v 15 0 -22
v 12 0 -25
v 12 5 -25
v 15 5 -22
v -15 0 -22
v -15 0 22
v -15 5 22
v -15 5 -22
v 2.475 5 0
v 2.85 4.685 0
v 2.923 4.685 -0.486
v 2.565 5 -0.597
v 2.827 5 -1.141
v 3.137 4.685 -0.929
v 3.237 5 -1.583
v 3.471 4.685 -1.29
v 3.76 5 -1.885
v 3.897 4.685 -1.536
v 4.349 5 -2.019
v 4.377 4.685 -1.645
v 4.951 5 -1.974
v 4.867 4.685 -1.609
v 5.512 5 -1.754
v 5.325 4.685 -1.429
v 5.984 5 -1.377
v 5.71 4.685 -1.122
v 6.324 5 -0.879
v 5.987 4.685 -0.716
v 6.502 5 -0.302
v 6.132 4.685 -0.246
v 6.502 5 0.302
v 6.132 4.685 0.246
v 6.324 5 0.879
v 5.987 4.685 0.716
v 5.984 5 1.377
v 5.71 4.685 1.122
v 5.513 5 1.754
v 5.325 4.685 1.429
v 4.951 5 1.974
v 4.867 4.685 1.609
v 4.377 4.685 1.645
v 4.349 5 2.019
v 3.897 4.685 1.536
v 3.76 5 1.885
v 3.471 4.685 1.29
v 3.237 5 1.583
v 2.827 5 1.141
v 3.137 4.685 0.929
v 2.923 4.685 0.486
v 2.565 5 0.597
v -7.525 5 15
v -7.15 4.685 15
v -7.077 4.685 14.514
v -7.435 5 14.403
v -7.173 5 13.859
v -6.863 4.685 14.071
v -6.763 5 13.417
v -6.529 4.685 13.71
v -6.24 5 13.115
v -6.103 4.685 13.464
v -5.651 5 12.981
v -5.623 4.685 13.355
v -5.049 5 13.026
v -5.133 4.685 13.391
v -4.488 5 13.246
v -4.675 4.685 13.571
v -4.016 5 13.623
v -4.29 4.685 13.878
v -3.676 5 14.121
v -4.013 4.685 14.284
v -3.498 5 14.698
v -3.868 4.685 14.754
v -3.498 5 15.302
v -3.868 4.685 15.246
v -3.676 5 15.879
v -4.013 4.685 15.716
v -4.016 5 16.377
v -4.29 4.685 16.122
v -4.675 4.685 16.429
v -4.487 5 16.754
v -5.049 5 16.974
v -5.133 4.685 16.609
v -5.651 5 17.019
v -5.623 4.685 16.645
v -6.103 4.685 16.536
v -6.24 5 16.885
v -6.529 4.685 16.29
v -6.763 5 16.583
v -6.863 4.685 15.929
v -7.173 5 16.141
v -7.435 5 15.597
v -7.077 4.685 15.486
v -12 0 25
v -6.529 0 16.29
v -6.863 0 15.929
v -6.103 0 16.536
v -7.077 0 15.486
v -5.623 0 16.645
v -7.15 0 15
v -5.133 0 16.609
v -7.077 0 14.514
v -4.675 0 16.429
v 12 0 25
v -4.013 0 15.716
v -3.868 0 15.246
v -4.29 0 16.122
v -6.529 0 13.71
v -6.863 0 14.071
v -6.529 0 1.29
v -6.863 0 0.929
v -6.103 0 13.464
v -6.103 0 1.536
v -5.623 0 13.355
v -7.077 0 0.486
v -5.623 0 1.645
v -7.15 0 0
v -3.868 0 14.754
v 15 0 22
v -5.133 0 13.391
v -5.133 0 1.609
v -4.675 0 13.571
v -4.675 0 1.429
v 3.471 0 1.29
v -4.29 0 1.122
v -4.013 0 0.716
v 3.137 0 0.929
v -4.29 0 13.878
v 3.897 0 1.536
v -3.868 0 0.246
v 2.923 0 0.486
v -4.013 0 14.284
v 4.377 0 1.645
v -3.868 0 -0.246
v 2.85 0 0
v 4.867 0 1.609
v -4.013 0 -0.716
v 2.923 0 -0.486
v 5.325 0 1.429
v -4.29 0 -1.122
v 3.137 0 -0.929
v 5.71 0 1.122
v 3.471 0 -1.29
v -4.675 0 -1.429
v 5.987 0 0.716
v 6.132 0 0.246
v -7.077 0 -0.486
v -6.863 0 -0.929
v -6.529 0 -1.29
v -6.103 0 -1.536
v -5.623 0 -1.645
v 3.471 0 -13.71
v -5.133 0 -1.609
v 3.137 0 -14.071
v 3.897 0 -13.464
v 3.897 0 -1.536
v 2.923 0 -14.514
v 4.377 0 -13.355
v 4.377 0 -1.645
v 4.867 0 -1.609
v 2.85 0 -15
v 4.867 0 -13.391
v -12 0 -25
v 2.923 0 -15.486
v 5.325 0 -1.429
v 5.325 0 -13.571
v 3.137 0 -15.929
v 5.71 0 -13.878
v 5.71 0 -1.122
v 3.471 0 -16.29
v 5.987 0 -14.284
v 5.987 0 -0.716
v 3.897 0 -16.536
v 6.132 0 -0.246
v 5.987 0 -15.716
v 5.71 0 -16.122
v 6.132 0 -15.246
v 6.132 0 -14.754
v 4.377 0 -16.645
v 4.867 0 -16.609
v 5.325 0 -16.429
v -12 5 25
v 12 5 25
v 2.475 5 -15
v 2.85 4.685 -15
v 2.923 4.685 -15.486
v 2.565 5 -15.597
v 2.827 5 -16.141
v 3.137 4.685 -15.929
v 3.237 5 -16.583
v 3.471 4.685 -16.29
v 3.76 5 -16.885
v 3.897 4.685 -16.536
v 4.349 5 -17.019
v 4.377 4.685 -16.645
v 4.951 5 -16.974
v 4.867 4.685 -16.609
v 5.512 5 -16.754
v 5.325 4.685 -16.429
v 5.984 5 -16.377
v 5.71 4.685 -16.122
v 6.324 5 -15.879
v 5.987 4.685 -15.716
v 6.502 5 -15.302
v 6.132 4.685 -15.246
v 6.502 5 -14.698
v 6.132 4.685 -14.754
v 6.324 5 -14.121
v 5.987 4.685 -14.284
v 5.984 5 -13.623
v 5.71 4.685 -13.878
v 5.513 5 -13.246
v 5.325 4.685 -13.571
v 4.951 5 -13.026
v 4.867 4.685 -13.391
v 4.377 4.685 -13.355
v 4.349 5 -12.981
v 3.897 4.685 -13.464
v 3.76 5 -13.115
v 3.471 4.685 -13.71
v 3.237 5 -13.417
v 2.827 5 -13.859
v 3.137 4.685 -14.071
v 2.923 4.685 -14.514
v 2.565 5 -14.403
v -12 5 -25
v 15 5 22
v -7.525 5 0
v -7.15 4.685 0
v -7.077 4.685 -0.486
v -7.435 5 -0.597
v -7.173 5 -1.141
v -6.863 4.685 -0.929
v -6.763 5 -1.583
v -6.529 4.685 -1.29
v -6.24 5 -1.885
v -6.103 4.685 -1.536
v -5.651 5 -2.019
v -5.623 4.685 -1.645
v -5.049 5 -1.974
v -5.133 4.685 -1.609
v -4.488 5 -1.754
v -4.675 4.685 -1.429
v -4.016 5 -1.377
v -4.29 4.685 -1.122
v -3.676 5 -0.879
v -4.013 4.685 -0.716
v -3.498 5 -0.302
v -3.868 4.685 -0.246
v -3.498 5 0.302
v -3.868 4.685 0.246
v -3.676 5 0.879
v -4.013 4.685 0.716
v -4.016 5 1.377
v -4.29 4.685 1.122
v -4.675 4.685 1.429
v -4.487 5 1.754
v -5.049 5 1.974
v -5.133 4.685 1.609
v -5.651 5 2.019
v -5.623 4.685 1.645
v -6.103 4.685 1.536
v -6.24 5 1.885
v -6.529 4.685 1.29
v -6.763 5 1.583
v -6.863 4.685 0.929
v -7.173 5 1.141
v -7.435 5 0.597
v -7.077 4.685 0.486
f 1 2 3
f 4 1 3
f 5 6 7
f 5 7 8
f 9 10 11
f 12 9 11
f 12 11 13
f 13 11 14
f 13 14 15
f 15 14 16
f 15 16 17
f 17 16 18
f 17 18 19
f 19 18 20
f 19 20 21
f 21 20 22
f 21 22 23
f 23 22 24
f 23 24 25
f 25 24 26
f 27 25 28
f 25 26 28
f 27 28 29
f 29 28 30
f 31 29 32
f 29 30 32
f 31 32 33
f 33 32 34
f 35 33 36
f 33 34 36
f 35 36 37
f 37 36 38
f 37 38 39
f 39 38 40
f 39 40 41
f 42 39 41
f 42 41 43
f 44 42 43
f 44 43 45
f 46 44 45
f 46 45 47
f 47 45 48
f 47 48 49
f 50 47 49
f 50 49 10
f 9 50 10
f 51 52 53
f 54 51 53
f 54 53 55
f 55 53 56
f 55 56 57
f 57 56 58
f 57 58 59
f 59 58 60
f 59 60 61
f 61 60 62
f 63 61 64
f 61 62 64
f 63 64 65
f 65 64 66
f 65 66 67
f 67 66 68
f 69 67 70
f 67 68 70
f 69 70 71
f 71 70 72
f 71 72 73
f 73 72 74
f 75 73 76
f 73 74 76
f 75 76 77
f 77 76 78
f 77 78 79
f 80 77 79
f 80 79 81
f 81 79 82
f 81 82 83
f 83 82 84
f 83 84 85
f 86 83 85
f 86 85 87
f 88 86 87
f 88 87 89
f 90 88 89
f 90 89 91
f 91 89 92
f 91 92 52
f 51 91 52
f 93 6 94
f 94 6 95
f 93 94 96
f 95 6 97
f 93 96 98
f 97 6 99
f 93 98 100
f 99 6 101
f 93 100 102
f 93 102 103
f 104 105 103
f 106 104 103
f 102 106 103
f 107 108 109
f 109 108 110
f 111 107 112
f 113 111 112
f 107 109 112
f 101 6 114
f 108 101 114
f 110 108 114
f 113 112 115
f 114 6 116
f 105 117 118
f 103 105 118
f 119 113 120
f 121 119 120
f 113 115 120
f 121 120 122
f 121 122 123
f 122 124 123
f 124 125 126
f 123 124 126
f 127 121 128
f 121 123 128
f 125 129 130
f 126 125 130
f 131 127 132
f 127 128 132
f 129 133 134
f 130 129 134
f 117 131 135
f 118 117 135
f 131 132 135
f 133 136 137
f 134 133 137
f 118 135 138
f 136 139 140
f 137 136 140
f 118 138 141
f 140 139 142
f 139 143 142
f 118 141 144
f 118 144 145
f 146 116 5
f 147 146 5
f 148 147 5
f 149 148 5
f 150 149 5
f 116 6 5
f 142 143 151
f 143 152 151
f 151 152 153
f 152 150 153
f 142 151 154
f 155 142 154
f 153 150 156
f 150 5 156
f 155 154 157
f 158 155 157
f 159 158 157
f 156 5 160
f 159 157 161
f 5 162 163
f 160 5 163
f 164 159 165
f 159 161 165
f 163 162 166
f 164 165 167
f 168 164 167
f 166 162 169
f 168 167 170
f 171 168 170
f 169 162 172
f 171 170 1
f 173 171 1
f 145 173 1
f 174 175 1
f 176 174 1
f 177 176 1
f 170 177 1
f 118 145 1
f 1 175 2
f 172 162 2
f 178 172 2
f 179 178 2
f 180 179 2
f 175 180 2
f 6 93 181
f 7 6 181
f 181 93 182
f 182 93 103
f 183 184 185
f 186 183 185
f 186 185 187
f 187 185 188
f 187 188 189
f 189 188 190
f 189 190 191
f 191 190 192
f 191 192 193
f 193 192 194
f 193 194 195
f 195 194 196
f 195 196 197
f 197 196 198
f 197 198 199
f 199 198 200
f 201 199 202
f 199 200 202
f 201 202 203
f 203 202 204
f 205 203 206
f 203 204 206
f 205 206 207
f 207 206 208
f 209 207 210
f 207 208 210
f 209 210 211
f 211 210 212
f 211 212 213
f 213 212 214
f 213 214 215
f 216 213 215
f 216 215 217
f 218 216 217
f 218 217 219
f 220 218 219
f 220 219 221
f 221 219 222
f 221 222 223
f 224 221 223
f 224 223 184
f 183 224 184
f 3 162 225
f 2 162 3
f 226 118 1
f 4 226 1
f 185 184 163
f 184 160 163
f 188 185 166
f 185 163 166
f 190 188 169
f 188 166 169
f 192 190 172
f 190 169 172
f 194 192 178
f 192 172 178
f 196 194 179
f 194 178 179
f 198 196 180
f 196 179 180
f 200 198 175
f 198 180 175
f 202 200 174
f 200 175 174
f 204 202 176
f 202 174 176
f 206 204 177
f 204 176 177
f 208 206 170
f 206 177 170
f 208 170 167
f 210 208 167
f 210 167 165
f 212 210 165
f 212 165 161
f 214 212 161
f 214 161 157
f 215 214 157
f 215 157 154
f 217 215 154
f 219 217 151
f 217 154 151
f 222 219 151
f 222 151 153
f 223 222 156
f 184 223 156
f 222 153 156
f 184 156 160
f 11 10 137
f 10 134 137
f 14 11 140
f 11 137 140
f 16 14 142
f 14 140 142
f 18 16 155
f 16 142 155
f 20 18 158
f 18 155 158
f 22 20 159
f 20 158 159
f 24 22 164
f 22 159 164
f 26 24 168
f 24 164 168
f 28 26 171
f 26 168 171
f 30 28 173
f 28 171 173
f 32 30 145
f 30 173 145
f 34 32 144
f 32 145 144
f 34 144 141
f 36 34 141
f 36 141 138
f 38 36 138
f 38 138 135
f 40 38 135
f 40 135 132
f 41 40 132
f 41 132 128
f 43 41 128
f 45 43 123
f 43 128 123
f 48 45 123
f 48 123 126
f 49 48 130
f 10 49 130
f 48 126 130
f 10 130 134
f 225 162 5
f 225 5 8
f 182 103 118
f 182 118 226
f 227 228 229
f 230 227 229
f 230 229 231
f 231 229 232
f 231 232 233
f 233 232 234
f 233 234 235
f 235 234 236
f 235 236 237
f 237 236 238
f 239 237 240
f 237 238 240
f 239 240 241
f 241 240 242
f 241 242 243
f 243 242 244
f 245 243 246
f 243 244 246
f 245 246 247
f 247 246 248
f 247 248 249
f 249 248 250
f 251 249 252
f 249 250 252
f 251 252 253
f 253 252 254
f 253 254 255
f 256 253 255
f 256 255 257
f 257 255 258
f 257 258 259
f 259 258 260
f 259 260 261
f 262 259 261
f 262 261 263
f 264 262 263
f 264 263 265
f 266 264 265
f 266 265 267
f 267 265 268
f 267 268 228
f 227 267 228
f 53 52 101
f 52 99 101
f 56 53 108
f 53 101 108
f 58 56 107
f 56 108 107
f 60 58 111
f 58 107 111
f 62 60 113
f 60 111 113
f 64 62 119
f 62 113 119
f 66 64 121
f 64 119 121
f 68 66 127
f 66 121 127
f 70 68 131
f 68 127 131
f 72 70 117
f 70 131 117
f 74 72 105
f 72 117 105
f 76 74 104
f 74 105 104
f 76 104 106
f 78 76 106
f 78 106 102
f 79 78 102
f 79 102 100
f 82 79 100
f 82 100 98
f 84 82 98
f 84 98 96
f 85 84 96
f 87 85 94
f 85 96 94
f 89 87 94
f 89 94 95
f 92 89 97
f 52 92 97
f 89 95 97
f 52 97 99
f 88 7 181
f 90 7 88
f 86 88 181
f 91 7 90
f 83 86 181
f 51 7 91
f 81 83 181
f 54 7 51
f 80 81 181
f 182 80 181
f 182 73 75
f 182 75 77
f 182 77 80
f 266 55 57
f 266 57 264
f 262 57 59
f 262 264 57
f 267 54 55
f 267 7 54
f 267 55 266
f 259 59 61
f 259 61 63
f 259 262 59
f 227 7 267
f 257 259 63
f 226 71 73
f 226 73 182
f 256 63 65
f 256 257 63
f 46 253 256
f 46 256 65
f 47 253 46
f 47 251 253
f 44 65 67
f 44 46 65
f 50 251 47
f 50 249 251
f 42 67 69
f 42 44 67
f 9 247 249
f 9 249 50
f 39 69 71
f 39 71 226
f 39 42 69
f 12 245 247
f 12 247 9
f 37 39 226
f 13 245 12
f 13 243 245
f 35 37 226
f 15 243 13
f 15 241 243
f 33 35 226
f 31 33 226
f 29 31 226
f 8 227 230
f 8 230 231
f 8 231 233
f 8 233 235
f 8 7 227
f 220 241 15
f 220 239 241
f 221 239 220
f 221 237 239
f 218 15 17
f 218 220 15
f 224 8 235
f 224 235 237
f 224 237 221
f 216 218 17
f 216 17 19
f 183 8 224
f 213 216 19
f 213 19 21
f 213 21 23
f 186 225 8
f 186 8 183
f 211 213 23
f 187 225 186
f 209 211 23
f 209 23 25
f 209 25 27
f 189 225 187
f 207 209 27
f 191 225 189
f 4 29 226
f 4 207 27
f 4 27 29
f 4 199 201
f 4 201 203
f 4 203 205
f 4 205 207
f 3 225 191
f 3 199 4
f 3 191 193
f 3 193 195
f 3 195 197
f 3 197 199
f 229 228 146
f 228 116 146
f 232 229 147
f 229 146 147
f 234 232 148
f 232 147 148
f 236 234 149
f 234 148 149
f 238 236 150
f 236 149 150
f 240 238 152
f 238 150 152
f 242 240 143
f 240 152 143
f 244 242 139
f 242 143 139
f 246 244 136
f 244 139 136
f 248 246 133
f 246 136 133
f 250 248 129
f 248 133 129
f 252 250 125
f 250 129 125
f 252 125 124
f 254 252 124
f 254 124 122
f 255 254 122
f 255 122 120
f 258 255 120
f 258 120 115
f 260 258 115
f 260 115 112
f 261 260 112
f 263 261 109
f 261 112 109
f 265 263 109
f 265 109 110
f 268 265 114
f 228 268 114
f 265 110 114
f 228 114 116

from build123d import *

# Parameters (mm, degrees)
SKETCH1_W                       = 30
SKETCH1_H                       = 50
BOSS_EXTRUDE1_DEPTH             = 5
M4X0_7_TAPPED_HOLE1_D           = 3.3
M4X0_7_TAPPED_HOLE1_CSINK_D     = 4.05
M4X0_7_TAPPED_HOLE1_CSINK_ANGLE = 100
CHAMFER1_SIZE                   = 3


with BuildPart() as part:
    # Sketch1 → Boss-Extrude1 (new body)
    with BuildSketch(Plane(origin=(0, 0, 0), x_dir=(1, 0, 0), z_dir=(0, 1, 0))):
        Rectangle(SKETCH1_W, SKETCH1_H)
    extrude(amount=BOSS_EXTRUDE1_DEPTH)

    # M4x0.7 Tapped Hole1 (through all)
    with Locations(Plane(origin=(0, 5, 0), x_dir=(1, 0, 0), z_dir=(0, 1, 0))):
        with Locations((-5.5, -15), (-5.5, 0), (4.5, 0), (4.5, 15)):
            CounterSinkHole(M4X0_7_TAPPED_HOLE1_D / 2, M4X0_7_TAPPED_HOLE1_CSINK_D / 2, counter_sink_angle=M4X0_7_TAPPED_HOLE1_CSINK_ANGLE)

    # Chamfer1
    chamfer1_edges = [part.edges().sort_by_distance(p)[0] for p in [
        (15, 2.5, 25),
        (-15, 2.5, 25),
        (-15, 2.5, -25),
        (15, 2.5, -25),
    ]]
    chamfer(chamfer1_edges, length=CHAMFER1_SIZE)


solid = part.part
